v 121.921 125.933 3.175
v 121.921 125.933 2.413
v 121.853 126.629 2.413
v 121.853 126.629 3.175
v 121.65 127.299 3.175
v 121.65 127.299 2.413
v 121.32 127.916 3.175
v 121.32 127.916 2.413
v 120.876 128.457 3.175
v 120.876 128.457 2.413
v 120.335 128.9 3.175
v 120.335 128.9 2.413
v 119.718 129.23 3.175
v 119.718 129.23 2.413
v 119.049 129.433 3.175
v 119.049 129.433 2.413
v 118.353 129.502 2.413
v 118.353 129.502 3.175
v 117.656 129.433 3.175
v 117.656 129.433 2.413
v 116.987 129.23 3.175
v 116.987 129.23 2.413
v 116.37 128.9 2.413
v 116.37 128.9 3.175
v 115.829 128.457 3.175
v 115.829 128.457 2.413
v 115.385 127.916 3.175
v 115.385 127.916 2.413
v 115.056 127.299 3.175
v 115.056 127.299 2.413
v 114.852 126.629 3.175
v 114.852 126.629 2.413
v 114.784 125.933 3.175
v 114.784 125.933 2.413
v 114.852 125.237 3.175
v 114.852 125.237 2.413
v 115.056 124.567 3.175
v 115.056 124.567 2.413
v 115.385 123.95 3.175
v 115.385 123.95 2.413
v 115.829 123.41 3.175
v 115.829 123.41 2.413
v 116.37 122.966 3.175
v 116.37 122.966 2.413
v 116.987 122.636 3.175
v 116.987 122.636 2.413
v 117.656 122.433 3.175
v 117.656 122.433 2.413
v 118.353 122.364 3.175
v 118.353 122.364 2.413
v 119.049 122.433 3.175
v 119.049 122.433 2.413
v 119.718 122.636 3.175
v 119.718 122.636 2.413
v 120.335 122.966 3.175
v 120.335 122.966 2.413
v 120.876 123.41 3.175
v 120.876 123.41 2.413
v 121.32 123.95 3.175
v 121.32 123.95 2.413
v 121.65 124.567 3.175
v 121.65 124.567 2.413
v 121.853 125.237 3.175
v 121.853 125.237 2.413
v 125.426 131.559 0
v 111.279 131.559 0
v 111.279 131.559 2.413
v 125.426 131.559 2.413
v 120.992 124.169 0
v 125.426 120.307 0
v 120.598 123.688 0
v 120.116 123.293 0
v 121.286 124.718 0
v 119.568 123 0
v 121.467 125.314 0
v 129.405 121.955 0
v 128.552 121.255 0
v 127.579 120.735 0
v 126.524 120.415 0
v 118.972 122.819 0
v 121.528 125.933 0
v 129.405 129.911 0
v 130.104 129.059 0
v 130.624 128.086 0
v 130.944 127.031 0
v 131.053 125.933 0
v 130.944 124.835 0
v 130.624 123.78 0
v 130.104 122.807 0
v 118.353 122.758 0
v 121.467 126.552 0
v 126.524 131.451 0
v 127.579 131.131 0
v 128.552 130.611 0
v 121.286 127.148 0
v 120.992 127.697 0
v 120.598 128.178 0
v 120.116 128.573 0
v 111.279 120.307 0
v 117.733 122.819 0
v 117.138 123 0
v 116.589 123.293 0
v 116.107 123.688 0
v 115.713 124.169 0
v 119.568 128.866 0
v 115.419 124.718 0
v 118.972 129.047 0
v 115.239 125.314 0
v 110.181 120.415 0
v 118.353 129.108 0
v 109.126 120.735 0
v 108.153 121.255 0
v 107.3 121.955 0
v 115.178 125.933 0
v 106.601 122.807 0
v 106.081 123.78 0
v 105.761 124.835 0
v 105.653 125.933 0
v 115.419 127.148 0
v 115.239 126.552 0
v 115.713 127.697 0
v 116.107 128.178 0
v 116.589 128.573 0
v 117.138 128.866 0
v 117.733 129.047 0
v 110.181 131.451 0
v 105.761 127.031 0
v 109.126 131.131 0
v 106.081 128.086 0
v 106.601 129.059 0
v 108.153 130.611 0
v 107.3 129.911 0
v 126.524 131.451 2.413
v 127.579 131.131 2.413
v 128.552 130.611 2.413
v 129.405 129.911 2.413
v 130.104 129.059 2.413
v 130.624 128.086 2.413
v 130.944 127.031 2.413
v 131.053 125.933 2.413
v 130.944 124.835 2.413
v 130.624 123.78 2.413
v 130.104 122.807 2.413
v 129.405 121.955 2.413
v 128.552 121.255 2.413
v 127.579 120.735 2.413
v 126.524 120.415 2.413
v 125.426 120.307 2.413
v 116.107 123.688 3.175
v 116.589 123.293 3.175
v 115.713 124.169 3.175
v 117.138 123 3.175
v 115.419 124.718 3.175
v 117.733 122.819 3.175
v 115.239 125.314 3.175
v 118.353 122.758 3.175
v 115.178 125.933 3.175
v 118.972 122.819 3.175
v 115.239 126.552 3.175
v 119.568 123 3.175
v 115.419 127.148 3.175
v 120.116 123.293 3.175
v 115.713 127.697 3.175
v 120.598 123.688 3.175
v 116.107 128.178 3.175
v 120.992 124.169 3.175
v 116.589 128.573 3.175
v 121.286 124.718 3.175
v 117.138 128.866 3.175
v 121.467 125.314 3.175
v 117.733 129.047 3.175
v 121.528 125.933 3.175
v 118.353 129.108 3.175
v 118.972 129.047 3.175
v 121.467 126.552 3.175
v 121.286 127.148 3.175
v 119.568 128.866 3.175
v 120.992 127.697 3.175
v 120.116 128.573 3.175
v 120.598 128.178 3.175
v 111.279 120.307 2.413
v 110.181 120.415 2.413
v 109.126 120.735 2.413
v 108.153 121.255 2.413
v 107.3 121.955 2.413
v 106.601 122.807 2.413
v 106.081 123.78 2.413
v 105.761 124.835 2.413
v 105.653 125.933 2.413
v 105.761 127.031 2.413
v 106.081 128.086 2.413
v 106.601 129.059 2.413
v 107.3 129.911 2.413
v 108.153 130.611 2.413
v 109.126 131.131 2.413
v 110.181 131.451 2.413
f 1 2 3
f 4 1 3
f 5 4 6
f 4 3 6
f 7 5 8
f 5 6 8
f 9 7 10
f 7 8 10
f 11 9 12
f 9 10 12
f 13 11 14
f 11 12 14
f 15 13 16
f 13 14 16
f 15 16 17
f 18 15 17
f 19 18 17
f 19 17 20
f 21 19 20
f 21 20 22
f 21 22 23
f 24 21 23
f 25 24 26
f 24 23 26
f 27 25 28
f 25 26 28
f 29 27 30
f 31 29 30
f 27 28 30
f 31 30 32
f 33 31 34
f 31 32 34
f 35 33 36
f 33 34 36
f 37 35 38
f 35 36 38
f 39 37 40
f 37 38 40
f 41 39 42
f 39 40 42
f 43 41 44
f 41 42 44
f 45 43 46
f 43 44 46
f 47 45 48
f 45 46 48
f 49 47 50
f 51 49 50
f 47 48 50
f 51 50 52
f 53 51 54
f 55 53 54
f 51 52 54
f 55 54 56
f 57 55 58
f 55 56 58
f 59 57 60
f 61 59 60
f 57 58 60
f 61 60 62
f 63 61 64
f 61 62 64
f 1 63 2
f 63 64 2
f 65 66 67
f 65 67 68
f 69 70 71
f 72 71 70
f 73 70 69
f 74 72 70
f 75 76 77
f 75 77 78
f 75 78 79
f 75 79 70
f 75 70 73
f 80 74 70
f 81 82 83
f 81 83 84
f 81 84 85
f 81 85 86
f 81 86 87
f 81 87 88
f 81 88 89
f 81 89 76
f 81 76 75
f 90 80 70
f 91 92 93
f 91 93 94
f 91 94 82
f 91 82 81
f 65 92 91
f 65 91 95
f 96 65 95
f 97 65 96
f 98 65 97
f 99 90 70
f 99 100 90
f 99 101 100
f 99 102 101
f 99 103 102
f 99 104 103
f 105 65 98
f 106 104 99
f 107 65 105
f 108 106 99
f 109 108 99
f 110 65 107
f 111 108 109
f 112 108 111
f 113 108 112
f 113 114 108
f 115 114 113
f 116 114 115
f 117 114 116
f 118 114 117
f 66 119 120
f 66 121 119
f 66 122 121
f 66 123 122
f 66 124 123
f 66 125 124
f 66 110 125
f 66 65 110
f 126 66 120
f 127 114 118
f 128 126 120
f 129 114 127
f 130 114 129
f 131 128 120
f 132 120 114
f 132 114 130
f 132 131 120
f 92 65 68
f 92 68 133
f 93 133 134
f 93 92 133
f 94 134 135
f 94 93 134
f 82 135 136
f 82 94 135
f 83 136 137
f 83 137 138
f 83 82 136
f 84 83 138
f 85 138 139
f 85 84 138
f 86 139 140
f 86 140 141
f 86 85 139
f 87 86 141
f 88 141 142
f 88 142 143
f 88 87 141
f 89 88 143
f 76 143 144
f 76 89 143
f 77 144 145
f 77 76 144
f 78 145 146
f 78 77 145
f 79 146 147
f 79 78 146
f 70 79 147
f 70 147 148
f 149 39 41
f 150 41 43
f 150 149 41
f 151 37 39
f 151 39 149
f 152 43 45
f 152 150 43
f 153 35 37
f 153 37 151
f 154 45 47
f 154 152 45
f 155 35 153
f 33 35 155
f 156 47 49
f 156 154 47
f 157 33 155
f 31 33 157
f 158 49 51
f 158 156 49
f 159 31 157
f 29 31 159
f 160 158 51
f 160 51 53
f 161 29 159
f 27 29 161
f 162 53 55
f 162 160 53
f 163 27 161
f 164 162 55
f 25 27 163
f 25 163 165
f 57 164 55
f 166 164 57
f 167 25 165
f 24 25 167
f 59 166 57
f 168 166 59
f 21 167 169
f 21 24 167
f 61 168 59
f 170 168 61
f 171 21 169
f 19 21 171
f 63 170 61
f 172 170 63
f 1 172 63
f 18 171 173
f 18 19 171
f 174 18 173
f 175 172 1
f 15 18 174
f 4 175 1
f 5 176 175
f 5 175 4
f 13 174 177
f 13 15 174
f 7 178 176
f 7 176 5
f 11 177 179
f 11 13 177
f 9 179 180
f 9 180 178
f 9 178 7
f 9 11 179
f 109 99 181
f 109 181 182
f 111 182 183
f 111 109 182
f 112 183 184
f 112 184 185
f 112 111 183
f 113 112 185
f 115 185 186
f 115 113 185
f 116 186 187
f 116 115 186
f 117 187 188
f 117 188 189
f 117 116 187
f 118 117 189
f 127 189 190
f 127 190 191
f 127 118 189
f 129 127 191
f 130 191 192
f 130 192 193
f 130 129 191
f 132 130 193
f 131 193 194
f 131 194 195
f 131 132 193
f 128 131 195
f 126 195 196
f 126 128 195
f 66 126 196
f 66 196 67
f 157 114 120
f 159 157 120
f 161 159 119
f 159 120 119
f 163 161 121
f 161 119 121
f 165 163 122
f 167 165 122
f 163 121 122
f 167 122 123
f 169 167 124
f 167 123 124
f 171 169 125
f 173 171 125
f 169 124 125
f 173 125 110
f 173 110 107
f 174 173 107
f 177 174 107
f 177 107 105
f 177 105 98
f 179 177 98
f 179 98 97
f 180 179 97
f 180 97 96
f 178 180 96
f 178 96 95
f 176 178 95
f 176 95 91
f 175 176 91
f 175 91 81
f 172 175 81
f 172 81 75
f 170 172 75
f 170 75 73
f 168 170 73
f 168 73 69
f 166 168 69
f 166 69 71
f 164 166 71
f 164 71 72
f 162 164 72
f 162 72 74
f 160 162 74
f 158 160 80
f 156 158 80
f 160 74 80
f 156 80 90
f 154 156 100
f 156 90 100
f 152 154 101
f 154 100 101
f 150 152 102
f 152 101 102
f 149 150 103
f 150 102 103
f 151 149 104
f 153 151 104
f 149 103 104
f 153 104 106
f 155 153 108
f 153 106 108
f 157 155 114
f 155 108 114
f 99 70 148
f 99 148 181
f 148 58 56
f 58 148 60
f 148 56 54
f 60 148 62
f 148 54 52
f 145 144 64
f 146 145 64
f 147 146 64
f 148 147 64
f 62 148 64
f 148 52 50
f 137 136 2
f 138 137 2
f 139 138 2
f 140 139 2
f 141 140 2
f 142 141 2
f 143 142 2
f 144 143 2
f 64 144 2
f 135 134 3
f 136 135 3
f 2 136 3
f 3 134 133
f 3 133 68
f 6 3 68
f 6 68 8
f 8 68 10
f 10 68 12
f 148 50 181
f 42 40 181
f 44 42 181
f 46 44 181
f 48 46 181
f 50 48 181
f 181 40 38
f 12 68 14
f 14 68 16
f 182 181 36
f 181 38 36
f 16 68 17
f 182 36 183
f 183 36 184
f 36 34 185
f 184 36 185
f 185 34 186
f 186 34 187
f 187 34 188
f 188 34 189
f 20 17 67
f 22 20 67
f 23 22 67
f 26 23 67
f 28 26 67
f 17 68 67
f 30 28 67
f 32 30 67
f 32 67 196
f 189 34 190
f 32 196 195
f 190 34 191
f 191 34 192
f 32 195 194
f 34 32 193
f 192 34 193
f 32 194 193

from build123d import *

# Parameters (mm, degrees)
EXTRUDE1_DEPTH     = 2.413
SKETCH4_R          = 3.5687
EXTRUDE3_DEPTH     = 0.762
SKETCH6_R          = 3.175
CUT_EXTRUDE1_DEPTH = 4.175


with BuildPart() as part:
    # Sketch1 → Extrude1 (new body)
    with BuildSketch(Plane.XY):
        with BuildLine():
            Line((111.27866266, 131.559165896), (125.42646266, 131.559165896))
            ThreePointArc((125.42646266, 131.559165896), (131.05256266, 125.933065896), (125.42646266, 120.306965896))
            Line((125.42646266, 120.306965896), (111.27866266, 120.306965896))
            ThreePointArc((111.27866266, 120.306965896), (105.65256266, 125.933065896), (111.27866266, 131.559165896))
        make_face()
    extrude(amount=EXTRUDE1_DEPTH)

    # Sketch4 → Extrude3 (add)
    with BuildSketch(Plane.XY.offset(2.413)):
        with Locations((118.35256266, 125.933065896)):
            Circle(SKETCH4_R)
    extrude(amount=EXTRUDE3_DEPTH)

    # Sketch6 → Cut-Extrude1 (cut, through all)
    with BuildSketch(Plane(origin=(0, 0, 0), x_dir=(-1, 0, 0), z_dir=(0, 0, -1))):
        with Locations((-118.35256266, 125.933065896)):
            Circle(SKETCH6_R)
    extrude(amount=-CUT_EXTRUDE1_DEPTH, mode=Mode.SUBTRACT)


solid = part.part
